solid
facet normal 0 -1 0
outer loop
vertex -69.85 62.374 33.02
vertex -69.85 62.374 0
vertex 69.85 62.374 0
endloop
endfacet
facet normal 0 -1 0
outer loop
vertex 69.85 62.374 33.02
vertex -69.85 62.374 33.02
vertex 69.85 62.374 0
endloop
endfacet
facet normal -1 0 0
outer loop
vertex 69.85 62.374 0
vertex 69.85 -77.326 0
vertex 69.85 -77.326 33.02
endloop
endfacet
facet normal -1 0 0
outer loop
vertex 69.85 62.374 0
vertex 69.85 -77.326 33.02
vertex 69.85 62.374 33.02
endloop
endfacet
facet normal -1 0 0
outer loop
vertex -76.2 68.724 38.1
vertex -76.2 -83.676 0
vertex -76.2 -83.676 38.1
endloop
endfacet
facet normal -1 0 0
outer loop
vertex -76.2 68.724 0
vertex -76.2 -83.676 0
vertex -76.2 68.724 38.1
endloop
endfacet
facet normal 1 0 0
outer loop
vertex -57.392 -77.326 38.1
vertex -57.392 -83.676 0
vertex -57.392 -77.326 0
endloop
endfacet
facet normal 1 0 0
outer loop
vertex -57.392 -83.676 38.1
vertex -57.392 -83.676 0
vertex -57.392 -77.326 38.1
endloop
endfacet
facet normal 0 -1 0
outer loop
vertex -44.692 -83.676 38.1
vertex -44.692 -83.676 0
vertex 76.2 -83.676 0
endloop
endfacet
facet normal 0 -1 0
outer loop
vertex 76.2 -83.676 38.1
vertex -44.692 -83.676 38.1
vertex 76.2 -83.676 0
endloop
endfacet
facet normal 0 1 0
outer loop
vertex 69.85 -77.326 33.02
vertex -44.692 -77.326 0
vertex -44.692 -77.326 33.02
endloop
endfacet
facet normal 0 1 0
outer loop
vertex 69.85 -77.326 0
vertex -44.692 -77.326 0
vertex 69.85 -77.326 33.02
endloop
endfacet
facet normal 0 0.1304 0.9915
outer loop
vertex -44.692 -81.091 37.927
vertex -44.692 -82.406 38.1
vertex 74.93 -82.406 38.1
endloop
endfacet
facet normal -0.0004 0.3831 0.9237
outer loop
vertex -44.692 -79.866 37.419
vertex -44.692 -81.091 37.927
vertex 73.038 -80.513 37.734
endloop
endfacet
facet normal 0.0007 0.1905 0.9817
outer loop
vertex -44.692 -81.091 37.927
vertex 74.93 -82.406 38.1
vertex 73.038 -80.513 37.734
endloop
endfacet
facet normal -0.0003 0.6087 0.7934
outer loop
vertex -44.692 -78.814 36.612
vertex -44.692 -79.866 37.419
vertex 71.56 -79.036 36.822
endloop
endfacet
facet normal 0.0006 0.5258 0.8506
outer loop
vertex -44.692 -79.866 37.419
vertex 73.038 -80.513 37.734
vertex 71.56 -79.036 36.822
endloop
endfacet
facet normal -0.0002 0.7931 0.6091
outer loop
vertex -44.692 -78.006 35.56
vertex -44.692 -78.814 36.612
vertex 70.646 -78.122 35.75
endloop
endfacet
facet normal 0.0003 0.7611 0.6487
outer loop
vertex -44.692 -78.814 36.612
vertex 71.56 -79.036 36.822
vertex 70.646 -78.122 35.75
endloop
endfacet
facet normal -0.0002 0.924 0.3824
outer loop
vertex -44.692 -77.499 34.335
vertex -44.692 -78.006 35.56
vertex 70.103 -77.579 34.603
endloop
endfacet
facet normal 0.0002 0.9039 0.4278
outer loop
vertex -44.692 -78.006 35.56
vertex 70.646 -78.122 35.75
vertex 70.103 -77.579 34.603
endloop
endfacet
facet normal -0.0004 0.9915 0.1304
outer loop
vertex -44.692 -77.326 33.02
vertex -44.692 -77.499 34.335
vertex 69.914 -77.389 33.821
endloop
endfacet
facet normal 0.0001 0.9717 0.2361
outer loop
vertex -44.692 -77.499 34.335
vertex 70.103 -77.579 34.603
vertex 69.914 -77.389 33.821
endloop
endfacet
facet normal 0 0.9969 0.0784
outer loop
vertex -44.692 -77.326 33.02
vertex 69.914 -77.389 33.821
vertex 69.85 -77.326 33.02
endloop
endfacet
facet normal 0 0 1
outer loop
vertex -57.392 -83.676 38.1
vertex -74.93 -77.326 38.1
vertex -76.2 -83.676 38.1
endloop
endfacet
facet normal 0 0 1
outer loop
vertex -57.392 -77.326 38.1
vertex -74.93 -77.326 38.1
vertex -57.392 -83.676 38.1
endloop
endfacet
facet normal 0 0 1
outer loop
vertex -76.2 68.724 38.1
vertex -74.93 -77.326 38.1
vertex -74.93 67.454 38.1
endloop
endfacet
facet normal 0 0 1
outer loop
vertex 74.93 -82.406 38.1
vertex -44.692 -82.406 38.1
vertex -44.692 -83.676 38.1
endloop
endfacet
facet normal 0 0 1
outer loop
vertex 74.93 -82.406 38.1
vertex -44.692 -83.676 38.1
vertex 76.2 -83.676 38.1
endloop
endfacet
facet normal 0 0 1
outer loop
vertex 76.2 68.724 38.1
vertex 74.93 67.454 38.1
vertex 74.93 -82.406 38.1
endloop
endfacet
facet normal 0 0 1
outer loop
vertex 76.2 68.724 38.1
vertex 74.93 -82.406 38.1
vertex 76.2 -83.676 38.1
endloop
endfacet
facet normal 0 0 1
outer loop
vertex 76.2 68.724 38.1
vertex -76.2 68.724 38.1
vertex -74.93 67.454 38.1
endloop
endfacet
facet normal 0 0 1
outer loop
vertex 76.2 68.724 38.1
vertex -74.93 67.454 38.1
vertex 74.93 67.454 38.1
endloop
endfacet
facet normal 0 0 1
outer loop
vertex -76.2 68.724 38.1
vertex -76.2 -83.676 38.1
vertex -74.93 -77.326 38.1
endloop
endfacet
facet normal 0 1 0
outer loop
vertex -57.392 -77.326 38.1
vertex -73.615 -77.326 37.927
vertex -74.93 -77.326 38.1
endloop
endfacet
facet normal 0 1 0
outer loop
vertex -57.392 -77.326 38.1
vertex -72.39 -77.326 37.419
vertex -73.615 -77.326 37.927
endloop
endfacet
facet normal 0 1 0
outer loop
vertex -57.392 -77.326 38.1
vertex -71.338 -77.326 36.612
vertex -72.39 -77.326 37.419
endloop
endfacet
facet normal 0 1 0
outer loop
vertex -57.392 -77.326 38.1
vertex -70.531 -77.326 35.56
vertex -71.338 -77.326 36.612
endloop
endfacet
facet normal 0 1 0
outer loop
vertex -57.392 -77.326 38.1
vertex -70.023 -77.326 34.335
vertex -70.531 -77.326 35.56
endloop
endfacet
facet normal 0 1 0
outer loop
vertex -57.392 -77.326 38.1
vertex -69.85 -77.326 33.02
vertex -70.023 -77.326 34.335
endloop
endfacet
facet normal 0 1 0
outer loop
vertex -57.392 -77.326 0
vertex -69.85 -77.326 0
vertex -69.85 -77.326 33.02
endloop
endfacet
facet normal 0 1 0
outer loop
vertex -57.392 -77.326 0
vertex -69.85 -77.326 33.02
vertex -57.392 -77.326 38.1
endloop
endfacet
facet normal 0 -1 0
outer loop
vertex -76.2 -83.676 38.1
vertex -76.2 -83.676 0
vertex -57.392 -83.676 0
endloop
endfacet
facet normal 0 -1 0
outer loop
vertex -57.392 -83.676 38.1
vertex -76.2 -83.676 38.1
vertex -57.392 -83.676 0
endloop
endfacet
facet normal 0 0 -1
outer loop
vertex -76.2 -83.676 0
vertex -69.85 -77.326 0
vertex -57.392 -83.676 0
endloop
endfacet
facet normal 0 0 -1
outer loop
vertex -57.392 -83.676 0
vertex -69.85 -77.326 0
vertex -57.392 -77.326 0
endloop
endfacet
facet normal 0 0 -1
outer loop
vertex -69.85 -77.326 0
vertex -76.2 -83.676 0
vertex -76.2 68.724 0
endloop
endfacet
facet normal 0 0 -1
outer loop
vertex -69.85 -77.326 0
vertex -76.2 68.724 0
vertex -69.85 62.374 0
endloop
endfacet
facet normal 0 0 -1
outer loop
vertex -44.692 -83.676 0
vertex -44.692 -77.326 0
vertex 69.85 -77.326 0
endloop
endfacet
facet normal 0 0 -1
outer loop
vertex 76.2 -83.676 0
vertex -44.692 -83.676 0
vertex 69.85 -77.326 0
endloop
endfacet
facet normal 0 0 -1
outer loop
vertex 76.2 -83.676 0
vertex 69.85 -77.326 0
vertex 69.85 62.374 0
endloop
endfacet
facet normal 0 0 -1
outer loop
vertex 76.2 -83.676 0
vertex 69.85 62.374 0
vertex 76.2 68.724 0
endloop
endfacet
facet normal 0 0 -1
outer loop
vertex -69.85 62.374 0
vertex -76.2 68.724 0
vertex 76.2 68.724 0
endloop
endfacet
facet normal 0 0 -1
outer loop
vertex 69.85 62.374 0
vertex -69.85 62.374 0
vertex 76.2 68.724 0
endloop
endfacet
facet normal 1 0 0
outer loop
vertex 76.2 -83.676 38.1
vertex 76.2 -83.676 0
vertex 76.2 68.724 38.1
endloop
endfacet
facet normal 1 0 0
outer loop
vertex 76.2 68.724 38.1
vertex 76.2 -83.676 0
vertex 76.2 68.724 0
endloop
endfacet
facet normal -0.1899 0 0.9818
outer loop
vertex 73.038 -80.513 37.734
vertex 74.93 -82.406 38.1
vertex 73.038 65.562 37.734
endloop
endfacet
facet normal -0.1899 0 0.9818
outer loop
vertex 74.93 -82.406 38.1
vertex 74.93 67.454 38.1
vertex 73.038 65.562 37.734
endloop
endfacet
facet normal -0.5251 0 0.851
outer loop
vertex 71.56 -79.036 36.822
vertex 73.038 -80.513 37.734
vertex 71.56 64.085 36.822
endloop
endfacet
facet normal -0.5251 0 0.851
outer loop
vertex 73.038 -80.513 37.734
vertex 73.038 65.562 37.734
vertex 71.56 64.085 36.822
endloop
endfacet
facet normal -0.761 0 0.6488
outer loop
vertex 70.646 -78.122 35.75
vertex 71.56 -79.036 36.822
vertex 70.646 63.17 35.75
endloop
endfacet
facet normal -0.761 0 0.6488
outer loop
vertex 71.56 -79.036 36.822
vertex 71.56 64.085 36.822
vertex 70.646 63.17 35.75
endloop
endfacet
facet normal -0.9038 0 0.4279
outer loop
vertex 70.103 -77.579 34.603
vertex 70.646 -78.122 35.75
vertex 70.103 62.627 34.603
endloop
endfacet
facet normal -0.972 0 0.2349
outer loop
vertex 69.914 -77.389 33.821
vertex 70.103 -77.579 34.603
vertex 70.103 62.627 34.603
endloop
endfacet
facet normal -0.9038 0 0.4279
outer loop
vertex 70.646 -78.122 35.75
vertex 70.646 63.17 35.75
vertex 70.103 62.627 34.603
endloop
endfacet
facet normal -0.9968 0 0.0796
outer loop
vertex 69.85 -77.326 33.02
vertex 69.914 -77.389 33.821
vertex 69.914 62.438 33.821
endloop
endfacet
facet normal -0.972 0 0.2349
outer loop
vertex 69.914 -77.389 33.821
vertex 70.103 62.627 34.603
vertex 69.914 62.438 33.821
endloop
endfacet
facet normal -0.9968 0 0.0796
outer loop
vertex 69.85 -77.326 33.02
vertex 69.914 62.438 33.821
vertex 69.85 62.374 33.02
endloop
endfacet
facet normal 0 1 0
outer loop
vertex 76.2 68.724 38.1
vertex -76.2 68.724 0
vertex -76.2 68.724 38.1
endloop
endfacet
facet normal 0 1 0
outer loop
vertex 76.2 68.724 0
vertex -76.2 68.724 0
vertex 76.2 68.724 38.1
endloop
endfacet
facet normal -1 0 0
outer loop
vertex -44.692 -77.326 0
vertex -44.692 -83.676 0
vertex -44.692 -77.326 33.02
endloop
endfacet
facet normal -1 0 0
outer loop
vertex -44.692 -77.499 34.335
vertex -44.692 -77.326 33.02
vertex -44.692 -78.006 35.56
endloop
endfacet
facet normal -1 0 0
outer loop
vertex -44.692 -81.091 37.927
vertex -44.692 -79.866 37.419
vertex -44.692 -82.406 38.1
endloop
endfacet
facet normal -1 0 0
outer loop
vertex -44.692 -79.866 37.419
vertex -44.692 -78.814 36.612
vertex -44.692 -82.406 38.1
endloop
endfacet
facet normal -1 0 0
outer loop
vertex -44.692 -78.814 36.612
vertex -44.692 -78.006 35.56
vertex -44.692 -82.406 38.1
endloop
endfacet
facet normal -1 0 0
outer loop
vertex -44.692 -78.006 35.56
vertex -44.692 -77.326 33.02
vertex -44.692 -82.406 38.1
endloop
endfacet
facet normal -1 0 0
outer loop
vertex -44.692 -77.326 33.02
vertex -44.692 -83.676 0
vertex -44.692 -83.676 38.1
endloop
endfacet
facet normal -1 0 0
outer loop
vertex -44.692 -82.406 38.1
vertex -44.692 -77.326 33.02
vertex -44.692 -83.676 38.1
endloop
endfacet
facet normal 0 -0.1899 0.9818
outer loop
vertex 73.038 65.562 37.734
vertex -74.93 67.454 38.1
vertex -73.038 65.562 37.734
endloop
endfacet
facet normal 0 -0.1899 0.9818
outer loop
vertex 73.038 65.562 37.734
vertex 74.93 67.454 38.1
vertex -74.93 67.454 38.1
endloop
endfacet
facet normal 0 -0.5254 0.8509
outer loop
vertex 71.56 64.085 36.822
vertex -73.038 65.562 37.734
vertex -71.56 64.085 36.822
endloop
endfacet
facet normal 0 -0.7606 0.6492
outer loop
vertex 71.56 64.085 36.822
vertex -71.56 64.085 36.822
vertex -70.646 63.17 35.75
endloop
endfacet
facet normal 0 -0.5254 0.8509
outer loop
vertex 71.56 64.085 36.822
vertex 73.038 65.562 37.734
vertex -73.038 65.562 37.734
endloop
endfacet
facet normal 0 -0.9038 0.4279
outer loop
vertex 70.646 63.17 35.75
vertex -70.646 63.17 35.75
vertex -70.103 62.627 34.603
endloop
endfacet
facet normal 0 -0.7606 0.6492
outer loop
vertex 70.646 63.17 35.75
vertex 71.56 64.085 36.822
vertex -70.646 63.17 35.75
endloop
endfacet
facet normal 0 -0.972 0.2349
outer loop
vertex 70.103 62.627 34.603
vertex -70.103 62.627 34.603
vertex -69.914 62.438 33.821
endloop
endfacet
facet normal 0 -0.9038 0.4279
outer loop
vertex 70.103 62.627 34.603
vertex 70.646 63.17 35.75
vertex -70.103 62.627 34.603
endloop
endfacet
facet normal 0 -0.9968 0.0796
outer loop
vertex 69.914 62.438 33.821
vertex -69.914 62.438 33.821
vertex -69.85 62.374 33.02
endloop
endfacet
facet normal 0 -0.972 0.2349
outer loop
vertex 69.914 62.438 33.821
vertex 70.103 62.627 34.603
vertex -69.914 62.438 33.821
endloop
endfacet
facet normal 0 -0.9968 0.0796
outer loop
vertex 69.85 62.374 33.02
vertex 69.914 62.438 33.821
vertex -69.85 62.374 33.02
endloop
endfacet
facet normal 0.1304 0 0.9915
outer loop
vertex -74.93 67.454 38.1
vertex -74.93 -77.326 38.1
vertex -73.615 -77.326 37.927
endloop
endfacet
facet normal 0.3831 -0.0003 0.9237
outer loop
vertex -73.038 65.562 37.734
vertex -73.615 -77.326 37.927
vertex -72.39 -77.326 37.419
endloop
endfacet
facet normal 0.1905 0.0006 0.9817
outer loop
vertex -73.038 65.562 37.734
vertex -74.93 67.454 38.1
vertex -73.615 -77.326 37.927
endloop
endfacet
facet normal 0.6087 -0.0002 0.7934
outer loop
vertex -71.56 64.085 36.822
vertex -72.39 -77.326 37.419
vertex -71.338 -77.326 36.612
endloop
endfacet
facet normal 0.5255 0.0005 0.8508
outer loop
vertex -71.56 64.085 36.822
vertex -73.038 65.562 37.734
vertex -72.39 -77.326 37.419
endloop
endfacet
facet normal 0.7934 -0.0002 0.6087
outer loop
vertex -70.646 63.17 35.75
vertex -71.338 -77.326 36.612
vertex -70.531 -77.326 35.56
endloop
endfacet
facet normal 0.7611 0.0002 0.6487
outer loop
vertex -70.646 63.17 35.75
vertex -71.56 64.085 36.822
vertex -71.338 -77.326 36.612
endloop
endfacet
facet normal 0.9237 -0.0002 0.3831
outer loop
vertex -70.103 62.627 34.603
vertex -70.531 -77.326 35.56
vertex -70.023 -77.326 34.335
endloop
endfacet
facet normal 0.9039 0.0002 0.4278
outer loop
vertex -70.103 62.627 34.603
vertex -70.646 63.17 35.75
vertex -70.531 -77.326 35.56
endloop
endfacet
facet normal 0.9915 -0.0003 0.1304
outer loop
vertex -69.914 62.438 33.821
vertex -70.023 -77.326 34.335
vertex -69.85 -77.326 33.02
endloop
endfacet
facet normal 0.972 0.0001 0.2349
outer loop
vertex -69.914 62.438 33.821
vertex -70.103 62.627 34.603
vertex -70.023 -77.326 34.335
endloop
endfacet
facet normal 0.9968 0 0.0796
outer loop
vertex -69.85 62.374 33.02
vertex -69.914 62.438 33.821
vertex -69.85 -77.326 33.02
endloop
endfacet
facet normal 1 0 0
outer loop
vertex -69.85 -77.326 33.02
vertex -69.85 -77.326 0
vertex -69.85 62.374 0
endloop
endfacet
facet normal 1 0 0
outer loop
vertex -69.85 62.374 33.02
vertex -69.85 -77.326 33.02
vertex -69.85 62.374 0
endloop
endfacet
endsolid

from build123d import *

# Parameters (mm, degrees)
F0_W     = 152.4
F0_H     = 152.4
F0_W_2   = 139.7
F0_H_2   = 139.7
F1_DEPTH = 38.1
F2_W     = 12.7
F2_H     = 38.1
F3_DEPTH = 37.084
F4_R     = 5.08


with BuildPart() as f1:
    # F0 (on Top) → F1 (new body)
    with BuildSketch(Plane.XY):
        with Locations((0, -7.475798)):
            Rectangle(F0_W, F0_H)
        with Locations((0, -7.475798)):
            Rectangle(F0_W_2, F0_H_2, mode=Mode.SUBTRACT)
    extrude(amount=F1_DEPTH)

    # F2 (on face) → F3 (cut)
    with BuildSketch(Plane.XZ.offset(83.675798)):
        with Locations((-51.042333, 19.05)):
            Rectangle(F2_W, F2_H)
    extrude(amount=-F3_DEPTH, mode=Mode.SUBTRACT)

    # F4
    f4_edges = [f1.edges().sort_by_distance(p)[0] for p in [
        (69.85, -7.475798, 38.1),
        (0, 62.374202, 38.1),
        (12.578834, -77.325798, 38.1),
        (-69.85, -7.475798, 38.1),
    ]]
    fillet(f4_edges, radius=F4_R)


solid = f1.part
